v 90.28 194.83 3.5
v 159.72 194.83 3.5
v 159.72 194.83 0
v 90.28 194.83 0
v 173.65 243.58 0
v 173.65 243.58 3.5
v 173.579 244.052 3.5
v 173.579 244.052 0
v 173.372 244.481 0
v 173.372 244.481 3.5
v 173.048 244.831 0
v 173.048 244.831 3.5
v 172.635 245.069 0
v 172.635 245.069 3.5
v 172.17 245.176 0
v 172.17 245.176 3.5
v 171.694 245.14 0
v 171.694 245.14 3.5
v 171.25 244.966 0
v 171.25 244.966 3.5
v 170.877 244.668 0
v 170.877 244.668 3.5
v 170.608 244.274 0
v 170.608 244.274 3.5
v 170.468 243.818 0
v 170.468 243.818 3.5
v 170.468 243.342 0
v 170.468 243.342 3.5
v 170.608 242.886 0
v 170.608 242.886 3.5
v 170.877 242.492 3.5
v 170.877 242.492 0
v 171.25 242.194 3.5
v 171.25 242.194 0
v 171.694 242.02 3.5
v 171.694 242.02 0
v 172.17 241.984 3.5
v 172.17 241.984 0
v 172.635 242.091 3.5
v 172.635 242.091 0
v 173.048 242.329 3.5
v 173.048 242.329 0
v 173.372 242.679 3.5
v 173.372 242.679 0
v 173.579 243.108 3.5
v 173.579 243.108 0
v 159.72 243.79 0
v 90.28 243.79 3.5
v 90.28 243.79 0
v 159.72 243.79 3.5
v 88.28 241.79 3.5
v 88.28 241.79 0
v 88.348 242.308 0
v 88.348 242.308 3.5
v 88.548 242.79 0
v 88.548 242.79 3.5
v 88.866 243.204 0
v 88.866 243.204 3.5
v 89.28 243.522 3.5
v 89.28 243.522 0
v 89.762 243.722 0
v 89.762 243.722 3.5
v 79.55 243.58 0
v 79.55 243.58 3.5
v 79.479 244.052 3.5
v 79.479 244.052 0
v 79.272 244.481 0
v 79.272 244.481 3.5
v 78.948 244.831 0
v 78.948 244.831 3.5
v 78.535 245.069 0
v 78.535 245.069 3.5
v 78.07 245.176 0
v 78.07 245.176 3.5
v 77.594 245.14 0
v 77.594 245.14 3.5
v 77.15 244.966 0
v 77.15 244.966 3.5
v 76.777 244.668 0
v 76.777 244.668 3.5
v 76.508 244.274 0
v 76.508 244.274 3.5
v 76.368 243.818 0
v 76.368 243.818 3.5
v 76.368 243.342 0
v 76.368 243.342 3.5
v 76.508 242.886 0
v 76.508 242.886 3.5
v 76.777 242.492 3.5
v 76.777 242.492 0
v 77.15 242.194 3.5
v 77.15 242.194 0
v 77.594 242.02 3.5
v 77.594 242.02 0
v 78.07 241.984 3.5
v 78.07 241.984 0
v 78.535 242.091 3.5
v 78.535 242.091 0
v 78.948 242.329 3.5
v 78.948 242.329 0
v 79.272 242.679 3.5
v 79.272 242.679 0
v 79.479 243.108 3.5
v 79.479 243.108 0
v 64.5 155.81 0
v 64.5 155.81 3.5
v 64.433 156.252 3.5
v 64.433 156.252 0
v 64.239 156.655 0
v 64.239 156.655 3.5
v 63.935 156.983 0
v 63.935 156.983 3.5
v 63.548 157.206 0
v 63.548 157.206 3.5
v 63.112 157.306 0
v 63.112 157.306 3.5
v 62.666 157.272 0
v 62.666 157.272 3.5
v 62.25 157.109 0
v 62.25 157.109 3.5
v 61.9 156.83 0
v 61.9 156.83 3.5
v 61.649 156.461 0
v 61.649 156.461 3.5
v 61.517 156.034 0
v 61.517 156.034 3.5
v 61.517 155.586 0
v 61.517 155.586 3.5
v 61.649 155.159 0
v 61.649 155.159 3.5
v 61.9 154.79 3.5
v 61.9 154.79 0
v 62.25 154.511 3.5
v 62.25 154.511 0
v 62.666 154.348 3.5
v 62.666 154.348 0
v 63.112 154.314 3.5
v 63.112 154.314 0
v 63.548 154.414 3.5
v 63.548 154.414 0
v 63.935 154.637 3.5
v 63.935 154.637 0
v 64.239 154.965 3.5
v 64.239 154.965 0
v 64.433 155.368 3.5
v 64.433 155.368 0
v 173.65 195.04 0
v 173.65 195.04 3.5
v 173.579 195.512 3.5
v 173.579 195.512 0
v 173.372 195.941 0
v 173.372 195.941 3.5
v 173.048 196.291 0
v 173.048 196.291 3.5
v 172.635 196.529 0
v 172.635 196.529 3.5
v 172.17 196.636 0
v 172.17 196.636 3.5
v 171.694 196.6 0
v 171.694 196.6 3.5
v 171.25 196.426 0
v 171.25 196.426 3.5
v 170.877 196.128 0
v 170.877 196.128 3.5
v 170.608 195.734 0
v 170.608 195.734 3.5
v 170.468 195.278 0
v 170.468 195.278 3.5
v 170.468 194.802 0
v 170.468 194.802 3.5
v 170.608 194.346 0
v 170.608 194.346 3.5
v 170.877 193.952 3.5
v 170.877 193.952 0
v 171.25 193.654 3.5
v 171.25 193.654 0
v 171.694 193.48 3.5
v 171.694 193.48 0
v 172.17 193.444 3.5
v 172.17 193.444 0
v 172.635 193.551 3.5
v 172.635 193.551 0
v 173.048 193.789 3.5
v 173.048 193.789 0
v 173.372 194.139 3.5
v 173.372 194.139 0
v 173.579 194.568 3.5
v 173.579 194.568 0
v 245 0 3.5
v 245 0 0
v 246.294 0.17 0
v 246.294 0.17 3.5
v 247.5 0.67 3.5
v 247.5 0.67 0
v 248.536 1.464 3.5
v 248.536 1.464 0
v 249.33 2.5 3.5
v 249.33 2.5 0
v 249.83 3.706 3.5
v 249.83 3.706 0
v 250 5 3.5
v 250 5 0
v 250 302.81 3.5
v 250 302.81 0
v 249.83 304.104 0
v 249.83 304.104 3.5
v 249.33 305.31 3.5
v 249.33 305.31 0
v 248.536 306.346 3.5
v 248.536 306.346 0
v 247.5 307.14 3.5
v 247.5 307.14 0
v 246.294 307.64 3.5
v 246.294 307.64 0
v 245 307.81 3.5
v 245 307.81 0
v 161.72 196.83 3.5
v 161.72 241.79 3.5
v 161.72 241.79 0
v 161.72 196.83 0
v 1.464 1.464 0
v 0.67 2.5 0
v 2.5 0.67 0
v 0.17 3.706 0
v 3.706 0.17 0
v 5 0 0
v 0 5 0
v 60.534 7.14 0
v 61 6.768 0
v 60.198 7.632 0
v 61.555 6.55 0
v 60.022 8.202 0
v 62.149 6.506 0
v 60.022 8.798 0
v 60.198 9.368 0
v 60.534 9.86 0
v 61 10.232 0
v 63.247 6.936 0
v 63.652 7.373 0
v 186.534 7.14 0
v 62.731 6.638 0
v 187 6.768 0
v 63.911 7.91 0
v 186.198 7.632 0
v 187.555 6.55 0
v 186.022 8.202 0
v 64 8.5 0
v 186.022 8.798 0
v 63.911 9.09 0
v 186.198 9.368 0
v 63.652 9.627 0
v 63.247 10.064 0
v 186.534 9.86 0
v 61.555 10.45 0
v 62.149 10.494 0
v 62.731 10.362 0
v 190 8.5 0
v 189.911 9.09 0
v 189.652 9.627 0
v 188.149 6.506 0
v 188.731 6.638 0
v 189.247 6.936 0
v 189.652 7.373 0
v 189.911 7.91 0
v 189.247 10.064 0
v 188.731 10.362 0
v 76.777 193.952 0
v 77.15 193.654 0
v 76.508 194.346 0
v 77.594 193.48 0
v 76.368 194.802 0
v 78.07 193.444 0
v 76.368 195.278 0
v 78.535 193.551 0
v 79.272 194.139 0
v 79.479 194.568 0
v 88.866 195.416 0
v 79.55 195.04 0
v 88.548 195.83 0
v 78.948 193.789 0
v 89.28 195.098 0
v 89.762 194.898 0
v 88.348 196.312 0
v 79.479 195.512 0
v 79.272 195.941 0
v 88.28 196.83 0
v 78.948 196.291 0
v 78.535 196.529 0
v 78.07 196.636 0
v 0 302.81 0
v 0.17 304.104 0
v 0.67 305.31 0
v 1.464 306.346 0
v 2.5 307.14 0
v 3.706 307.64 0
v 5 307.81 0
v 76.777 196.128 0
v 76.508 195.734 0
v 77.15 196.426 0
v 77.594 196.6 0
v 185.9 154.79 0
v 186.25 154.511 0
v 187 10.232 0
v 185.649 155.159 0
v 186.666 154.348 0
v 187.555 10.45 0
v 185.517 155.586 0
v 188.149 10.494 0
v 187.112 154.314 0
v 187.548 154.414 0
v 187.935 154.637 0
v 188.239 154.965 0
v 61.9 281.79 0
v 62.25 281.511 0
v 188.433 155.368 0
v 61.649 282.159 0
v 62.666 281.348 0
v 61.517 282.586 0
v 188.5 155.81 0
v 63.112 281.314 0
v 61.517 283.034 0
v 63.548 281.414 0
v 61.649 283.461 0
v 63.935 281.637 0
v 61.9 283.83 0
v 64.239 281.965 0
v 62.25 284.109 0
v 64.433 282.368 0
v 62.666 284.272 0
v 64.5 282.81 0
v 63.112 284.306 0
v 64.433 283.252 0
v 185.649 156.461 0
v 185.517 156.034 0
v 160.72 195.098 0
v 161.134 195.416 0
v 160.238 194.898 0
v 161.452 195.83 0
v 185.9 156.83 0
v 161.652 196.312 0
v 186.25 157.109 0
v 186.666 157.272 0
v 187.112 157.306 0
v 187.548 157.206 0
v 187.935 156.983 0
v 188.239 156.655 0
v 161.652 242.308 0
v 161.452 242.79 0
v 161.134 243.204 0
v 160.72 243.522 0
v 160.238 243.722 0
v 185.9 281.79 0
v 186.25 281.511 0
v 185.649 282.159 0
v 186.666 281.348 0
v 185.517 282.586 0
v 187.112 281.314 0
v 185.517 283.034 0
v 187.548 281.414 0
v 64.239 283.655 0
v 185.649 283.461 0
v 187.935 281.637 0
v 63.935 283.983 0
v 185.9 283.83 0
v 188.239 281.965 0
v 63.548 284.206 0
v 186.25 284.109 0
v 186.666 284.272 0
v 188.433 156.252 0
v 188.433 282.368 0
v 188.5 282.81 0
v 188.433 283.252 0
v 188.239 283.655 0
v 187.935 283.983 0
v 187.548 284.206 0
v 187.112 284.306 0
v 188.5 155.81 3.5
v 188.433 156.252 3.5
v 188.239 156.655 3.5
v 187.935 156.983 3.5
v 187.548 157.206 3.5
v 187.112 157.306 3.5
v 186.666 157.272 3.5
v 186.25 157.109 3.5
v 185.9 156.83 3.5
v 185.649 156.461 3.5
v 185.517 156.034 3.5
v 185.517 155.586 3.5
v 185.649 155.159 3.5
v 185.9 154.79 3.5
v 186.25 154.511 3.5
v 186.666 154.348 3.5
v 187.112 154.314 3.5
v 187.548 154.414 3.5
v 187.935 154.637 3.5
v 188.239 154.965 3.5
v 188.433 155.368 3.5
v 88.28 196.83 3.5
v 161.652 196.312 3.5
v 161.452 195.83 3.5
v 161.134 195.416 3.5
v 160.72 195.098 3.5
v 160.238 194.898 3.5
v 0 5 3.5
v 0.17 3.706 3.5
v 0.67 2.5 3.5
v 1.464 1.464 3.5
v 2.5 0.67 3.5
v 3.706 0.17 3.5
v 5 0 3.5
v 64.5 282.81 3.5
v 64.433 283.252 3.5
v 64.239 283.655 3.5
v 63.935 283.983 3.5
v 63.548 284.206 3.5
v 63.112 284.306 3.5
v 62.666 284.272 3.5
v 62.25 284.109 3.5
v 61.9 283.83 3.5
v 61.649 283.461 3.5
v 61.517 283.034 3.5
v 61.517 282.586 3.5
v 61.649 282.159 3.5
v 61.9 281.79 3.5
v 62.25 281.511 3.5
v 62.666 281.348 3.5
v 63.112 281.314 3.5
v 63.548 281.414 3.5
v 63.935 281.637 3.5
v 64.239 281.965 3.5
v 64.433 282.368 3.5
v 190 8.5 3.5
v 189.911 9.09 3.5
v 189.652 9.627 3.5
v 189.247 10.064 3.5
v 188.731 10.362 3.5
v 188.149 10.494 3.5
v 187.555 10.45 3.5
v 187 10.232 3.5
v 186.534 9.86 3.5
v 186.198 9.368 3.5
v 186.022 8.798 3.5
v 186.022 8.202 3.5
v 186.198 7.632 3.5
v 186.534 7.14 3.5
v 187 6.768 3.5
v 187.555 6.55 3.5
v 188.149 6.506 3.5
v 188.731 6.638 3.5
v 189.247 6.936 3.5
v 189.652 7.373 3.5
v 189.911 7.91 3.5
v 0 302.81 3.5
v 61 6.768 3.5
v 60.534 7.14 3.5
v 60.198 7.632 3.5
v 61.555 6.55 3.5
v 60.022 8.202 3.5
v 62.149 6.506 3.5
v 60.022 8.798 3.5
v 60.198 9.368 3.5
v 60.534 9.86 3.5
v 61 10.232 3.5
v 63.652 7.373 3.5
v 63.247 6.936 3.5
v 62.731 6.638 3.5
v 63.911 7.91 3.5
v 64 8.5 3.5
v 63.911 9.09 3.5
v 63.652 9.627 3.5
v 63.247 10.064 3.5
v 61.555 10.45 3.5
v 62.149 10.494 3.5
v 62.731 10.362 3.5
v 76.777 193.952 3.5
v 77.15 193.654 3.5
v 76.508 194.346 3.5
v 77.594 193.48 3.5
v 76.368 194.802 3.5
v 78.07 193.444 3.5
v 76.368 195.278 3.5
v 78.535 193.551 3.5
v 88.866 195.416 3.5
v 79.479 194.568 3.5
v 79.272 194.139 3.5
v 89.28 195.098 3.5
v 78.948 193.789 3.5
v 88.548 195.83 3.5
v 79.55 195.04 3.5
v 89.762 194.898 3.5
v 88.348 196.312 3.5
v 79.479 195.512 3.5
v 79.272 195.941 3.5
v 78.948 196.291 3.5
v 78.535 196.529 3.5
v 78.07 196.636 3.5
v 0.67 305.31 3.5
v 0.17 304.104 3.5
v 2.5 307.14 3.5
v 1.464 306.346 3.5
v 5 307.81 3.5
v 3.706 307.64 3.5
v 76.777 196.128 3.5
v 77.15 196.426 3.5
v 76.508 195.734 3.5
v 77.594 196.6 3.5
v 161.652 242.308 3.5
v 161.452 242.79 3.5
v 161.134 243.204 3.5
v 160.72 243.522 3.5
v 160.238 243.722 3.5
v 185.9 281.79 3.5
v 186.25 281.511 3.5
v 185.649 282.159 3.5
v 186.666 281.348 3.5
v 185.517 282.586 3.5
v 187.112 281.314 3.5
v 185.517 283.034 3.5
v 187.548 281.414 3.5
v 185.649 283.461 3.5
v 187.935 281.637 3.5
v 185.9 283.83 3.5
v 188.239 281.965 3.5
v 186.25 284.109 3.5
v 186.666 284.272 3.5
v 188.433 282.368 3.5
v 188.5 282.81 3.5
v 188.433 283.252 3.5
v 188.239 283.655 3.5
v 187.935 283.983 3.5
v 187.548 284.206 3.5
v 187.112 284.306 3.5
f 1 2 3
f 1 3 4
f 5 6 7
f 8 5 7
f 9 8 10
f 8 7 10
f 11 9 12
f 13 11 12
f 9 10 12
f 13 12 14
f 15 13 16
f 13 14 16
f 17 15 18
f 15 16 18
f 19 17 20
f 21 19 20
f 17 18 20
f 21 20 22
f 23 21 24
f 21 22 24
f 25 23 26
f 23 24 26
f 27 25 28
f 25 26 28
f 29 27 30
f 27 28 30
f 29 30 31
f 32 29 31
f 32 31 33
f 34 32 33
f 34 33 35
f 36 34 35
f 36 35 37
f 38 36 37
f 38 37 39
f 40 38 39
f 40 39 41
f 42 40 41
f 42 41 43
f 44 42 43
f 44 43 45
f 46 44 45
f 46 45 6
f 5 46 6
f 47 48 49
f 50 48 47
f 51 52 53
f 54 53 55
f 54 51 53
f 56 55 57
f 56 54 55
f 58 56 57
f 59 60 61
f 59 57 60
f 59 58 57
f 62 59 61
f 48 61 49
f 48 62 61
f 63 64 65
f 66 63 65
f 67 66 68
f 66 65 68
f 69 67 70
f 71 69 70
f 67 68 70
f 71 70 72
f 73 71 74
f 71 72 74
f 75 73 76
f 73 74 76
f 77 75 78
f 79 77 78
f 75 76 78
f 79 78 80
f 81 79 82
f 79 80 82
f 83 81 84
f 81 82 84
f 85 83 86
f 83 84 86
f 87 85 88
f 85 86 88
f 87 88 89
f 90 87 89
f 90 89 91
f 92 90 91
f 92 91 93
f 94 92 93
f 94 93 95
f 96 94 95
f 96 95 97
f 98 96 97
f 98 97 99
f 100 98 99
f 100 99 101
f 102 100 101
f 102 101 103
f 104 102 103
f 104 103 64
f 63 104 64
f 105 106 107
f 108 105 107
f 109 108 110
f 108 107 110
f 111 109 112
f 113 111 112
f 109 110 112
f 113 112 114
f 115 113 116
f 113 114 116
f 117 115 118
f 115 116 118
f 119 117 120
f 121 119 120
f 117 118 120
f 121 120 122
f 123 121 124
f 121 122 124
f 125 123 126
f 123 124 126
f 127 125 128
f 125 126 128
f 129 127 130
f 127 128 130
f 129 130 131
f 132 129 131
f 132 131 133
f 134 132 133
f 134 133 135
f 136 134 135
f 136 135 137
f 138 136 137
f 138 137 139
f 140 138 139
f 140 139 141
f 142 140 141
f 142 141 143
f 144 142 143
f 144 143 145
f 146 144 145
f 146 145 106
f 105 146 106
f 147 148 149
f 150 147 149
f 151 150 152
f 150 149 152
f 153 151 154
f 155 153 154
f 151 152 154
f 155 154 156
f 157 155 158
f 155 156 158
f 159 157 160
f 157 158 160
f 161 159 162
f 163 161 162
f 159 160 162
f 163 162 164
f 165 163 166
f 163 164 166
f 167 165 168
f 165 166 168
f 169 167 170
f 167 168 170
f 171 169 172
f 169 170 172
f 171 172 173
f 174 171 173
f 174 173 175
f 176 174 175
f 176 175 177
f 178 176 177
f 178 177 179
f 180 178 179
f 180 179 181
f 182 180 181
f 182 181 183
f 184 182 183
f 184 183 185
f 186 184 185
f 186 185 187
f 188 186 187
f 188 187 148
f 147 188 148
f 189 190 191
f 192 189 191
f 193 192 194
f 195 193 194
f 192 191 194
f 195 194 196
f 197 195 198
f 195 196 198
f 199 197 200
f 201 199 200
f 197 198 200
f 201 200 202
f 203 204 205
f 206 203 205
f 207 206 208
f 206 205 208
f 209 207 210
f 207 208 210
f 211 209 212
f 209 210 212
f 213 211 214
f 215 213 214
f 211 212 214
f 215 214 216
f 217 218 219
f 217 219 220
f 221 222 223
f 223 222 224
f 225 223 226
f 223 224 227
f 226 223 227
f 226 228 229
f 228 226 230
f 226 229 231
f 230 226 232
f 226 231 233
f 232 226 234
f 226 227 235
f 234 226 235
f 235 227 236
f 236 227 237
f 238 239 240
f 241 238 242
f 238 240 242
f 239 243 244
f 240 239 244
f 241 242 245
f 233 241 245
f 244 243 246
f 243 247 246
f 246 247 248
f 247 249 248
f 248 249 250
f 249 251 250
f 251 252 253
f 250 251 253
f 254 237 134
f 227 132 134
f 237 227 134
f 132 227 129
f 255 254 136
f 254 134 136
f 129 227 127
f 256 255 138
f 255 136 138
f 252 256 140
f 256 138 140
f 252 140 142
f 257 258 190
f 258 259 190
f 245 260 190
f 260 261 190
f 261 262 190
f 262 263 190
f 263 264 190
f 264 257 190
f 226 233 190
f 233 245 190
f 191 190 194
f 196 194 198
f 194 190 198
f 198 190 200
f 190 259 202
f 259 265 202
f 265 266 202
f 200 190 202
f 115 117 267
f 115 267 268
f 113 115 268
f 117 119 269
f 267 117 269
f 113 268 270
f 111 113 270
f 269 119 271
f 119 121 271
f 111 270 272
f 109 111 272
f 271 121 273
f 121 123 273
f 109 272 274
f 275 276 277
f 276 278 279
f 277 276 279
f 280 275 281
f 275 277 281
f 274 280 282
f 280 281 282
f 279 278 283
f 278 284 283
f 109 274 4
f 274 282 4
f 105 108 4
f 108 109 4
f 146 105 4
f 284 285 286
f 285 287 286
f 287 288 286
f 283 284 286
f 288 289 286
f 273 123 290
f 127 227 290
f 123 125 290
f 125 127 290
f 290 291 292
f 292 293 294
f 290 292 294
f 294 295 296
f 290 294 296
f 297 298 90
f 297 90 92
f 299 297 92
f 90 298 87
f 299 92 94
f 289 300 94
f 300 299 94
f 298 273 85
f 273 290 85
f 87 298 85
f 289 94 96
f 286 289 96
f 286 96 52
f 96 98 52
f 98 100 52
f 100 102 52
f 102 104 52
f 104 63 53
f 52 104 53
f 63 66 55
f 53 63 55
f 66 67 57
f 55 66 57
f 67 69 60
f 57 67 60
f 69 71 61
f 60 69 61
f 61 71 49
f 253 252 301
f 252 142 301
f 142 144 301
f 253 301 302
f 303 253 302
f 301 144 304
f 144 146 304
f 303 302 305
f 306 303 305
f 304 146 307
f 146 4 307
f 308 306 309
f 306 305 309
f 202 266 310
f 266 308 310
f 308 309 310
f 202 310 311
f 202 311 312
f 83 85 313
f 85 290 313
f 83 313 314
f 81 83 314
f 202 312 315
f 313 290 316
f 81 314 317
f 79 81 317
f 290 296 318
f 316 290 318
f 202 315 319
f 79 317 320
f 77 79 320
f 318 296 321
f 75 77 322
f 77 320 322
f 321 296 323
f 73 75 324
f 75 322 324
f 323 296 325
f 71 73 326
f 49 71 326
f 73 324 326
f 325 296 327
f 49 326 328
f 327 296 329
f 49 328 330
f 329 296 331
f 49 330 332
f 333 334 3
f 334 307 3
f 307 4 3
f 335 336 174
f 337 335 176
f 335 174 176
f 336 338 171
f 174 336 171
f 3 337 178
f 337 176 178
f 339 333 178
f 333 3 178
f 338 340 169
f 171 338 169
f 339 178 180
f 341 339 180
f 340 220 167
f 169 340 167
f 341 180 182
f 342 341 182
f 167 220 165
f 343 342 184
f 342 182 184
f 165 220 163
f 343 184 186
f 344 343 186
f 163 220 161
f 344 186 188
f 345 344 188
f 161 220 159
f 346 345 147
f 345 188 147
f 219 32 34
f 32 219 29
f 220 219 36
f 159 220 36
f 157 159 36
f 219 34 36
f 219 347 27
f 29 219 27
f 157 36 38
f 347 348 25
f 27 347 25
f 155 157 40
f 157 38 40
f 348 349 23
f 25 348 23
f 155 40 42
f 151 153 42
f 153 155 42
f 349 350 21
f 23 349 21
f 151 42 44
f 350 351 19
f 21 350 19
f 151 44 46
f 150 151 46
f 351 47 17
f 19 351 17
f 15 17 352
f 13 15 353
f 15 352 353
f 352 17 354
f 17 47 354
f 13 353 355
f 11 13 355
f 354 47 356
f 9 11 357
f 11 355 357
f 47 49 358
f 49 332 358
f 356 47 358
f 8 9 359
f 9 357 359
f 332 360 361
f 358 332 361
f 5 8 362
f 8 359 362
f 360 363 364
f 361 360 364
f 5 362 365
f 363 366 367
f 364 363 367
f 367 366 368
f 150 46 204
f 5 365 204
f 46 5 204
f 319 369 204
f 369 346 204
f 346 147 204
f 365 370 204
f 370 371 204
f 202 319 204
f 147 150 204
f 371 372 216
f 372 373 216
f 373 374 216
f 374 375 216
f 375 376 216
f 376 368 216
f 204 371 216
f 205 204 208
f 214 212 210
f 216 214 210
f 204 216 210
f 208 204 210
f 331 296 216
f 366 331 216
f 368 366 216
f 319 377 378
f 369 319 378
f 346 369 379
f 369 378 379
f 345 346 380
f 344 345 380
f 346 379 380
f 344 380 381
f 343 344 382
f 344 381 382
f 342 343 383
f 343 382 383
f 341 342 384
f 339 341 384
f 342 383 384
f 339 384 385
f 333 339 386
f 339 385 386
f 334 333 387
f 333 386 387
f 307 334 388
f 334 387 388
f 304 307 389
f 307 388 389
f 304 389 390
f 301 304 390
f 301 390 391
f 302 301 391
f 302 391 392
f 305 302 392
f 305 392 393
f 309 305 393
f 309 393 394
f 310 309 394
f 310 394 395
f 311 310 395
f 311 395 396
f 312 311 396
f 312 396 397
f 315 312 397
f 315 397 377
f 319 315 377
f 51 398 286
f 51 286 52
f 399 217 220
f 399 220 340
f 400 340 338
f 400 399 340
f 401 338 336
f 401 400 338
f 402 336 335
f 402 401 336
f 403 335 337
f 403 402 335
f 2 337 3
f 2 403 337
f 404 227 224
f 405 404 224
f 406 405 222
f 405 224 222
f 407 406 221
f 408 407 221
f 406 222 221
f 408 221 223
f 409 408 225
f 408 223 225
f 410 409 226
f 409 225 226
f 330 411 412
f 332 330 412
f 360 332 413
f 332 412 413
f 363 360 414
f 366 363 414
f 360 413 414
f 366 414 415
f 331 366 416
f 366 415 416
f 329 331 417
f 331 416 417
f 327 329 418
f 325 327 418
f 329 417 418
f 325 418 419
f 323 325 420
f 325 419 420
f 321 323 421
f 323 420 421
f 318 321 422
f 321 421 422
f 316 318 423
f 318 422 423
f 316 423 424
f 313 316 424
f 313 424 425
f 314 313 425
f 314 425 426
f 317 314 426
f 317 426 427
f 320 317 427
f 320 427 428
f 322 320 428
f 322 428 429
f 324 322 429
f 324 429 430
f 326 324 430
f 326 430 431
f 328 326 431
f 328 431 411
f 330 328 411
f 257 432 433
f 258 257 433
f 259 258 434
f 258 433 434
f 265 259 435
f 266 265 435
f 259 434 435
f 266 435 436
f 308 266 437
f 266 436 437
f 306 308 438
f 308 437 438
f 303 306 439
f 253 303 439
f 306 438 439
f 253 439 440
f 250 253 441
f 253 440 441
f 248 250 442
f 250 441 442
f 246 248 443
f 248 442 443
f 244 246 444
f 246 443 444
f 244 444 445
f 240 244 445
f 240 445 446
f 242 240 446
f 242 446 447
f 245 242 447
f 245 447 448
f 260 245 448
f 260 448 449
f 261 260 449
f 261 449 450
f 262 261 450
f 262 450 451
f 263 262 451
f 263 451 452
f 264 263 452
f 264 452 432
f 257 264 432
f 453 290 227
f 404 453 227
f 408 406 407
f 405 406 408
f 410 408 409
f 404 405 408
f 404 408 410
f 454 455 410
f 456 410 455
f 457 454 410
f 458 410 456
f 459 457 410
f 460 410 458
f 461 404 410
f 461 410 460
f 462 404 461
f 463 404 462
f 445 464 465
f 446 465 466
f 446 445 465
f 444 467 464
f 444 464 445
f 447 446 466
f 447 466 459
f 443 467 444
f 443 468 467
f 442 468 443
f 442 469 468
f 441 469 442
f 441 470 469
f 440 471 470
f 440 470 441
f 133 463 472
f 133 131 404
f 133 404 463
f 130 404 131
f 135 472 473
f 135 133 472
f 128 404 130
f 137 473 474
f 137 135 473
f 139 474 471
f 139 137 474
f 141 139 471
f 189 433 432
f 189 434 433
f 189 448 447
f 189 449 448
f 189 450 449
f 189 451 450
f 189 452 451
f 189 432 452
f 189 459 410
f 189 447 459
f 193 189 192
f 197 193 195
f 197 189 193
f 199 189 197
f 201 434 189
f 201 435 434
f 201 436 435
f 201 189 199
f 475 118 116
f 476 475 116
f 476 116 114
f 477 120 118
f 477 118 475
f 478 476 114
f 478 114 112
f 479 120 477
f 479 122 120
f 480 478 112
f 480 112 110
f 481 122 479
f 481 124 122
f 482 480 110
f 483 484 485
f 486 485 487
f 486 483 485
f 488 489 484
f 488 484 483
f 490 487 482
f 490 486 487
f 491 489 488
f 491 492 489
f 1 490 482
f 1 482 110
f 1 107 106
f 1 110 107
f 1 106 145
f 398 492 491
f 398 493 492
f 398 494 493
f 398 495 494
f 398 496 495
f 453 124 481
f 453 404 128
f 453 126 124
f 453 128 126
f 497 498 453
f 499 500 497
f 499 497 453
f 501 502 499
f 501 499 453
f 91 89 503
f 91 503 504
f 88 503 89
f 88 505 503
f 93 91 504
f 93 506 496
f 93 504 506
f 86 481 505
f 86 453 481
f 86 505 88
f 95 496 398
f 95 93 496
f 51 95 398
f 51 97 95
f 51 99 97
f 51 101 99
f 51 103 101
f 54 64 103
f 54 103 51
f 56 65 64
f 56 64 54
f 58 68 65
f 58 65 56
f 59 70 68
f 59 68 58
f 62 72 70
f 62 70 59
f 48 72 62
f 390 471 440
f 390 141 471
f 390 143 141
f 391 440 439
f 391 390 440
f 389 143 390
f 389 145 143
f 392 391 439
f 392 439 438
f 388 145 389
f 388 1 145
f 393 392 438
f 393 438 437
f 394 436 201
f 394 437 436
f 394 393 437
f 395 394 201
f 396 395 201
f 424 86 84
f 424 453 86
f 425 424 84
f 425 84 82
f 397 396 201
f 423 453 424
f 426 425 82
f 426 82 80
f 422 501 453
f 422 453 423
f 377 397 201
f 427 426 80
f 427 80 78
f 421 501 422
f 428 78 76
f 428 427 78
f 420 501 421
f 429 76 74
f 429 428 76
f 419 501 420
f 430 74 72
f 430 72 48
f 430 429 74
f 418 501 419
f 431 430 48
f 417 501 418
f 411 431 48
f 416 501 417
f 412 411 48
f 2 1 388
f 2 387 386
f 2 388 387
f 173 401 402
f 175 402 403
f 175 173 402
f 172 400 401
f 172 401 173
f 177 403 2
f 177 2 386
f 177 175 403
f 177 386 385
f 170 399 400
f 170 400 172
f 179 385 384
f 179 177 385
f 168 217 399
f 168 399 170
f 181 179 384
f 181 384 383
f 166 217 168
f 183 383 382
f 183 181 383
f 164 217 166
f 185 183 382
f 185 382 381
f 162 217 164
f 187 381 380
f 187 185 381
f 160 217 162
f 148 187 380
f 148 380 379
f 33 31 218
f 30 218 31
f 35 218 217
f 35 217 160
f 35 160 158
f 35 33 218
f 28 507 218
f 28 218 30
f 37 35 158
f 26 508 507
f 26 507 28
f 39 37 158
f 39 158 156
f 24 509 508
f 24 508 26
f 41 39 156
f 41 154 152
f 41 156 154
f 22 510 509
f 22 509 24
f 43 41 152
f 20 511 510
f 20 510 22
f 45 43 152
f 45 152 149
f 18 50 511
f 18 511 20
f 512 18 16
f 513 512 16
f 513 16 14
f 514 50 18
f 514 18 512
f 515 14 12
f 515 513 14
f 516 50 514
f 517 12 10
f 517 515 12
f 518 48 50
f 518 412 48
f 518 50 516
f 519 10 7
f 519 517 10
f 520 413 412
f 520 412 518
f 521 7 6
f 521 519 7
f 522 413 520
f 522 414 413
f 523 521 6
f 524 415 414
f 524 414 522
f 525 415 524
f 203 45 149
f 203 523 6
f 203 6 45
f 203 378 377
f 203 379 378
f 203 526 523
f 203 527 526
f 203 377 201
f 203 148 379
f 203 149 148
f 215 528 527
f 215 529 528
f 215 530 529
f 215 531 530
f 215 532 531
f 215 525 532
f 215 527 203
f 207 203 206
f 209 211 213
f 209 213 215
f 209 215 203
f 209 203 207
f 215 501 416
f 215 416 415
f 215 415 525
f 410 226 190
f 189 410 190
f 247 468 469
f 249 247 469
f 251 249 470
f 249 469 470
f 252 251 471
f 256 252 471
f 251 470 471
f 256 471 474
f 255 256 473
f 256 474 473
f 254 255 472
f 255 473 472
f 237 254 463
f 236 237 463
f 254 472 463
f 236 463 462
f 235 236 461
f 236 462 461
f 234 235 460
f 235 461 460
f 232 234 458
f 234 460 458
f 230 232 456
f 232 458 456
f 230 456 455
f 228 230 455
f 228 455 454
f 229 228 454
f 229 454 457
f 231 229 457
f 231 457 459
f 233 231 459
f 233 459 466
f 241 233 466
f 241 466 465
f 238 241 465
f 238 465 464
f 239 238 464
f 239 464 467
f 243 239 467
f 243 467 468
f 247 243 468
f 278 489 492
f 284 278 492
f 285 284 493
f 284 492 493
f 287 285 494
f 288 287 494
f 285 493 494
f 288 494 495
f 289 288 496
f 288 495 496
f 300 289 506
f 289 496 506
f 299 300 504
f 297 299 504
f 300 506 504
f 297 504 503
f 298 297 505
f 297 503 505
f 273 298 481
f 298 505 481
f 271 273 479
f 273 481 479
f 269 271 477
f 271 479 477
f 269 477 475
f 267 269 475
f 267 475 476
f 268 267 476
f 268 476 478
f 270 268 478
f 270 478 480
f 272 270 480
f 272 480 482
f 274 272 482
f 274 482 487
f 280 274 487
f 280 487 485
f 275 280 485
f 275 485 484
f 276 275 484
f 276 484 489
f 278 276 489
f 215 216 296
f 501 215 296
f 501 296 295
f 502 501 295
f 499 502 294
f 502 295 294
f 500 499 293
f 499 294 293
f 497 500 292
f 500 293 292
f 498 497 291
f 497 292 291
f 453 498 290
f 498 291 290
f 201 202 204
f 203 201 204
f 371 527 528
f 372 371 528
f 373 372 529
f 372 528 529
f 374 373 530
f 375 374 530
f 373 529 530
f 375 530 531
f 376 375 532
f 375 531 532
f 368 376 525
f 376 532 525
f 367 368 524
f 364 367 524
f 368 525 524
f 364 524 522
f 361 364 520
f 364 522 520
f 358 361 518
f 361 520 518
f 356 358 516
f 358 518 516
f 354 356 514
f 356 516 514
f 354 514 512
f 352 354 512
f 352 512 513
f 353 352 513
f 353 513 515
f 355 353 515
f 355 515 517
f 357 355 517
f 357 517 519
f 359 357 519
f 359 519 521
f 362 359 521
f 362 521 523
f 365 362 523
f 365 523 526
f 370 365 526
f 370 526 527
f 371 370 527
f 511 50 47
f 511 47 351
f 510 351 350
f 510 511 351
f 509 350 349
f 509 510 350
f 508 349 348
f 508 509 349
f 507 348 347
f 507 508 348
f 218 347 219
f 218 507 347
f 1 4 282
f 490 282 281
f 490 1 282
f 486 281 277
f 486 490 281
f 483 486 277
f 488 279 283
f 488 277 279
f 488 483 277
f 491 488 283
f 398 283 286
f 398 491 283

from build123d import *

# Parameters (mm, degrees)
BOSS_EXTRU_1_DEPTH      = 3.5
ESQUISSE2_R             = 2
ENL_V_MAT_EXTRU_1_DEPTH = 397.559259254
ESQUISSE3_R             = 1.5
ESQUISSE3_R_2           = 1.6
ENL_V_MAT_EXTRU_2_DEPTH = 397.559259254
ENL_V_MAT_EXTRU_3_DEPTH = 397.559259254


with BuildPart() as part:
    # Esquisse1 → Boss.-Extru.1 (new body)
    with BuildSketch(Plane.XY):
        with BuildLine():
            Line((5, 0), (245, 0))
            ThreePointArc((245, 0), (248.535533906, 1.464466094), (250, 5))
            Line((250, 5), (250, 302.81))
            ThreePointArc((250, 302.81), (248.535533906, 306.345533906), (245, 307.81))
            Line((245, 307.81), (5, 307.81))
            ThreePointArc((5, 307.81), (1.464466094, 306.345533906), (0, 302.81))
            Line((0, 302.81), (0, 5))
            ThreePointArc((0, 5), (1.464466094, 1.464466094), (5, 0))
        make_face()
    extrude(amount=BOSS_EXTRU_1_DEPTH)

    # Esquisse2 → Enlèv. mat.-Extru.1 (cut, through all)
    with BuildSketch(Plane.XY.offset(3.5)):
        with Locations((62, 8.5)):
            Circle(ESQUISSE2_R)
        with Locations((188, 8.5)):
            Circle(ESQUISSE2_R)
    extrude(amount=-ENL_V_MAT_EXTRU_1_DEPTH, mode=Mode.SUBTRACT)

    # Esquisse3 → Enlèv. mat.-Extru.2 (cut, through all)
    with BuildSketch(Plane.XY.offset(3.5)):
        with Locations((63, 155.81)):
            Circle(ESQUISSE3_R)
        with Locations((63, 282.81)):
            Circle(ESQUISSE3_R)
        with Locations((187, 282.81)):
            Circle(ESQUISSE3_R)
        with Locations((187, 155.81)):
            Circle(ESQUISSE3_R)
        with Locations((77.95, 243.58)):
            Circle(ESQUISSE3_R_2)
        with Locations((172.05, 243.58)):
            Circle(ESQUISSE3_R_2)
        with Locations((77.95, 195.04)):
            Circle(ESQUISSE3_R_2)
        with Locations((172.05, 195.04)):
            Circle(ESQUISSE3_R_2)
    extrude(amount=-ENL_V_MAT_EXTRU_2_DEPTH, mode=Mode.SUBTRACT)

    # Esquisse4 → Enlèv. mat.-Extru.3 (cut, through all)
    with BuildSketch(Plane.XY.offset(3.5)):
        with BuildLine():
            Line((90.28, 243.79), (159.72, 243.79))
            ThreePointArc((159.72, 243.79), (161.134213562, 243.204213562), (161.72, 241.79))
            Line((161.72, 241.79), (161.72, 196.83))
            ThreePointArc((161.72, 196.83), (161.134213562, 195.415786438), (159.72, 194.83))
            Line((159.72, 194.83), (90.28, 194.83))
            ThreePointArc((90.28, 194.83), (88.865786438, 195.415786438), (88.28, 196.83))
            Line((88.28, 196.83), (88.28, 241.79))
            ThreePointArc((88.28, 241.79), (88.865786438, 243.204213562), (90.28, 243.79))
        make_face()
    extrude(amount=-ENL_V_MAT_EXTRU_3_DEPTH, mode=Mode.SUBTRACT)


solid = part.part
